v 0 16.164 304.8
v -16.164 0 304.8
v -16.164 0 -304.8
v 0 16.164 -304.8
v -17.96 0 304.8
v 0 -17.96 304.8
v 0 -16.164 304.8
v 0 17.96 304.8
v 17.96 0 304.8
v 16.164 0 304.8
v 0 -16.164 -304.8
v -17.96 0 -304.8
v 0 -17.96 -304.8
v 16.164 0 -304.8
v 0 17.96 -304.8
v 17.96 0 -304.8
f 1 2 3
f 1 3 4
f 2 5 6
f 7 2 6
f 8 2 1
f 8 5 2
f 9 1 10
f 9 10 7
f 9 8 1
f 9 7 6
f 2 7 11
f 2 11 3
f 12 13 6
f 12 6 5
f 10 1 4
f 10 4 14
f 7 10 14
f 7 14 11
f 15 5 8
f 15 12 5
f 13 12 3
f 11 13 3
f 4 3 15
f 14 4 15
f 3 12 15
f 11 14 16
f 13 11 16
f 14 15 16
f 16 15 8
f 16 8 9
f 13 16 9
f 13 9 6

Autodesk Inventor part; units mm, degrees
ref_plane "YZ Plane" through (0, 0, 0) normal (1, 0, 0) x (0, 1, 0)
ref_plane "XZ Plane" through (0, 0, 0) normal (0, 1, 0) x (-1, 0, 0)
ref_plane "XY Plane" through (0, 0, 0) normal (0, 0, 1) x (1, 0, 0)
sketch "Sketch1" plane through (0, 0, 0) normal (0, 0, 1) x (1, 0, 0)
  line L0 (0, 17.9605) -> (17.9605, 0)
  line L1 (17.9605, 0) -> (0, -17.9605)
  line L2 (0, -17.9605) -> (-17.9605, 0)
  line L3 (-17.9605, 0) -> (0, 17.9605)
  line L4 (0, 17.9605) -> (0, -17.9605) construction
  line L5 (17.9605, 0) -> (-17.9605, 0) construction
  point P0 (0, 0)
  point P1 (0, 0)
  point P2 (0, 0)
  point P3 (0, 0)
  dimension "d2" = 25.4
  dimension "d3" = 25.4
extrude "Extrusion1" add sketch "Sketch1" along normal mid plane 609.6
shell "Shell1" thickness 1.27 removed faces 2 at (0, -5.9868, 304.8) at (0, -5.9868, -304.8)
properties part number "base_rail" material "Aluminum 6061"
